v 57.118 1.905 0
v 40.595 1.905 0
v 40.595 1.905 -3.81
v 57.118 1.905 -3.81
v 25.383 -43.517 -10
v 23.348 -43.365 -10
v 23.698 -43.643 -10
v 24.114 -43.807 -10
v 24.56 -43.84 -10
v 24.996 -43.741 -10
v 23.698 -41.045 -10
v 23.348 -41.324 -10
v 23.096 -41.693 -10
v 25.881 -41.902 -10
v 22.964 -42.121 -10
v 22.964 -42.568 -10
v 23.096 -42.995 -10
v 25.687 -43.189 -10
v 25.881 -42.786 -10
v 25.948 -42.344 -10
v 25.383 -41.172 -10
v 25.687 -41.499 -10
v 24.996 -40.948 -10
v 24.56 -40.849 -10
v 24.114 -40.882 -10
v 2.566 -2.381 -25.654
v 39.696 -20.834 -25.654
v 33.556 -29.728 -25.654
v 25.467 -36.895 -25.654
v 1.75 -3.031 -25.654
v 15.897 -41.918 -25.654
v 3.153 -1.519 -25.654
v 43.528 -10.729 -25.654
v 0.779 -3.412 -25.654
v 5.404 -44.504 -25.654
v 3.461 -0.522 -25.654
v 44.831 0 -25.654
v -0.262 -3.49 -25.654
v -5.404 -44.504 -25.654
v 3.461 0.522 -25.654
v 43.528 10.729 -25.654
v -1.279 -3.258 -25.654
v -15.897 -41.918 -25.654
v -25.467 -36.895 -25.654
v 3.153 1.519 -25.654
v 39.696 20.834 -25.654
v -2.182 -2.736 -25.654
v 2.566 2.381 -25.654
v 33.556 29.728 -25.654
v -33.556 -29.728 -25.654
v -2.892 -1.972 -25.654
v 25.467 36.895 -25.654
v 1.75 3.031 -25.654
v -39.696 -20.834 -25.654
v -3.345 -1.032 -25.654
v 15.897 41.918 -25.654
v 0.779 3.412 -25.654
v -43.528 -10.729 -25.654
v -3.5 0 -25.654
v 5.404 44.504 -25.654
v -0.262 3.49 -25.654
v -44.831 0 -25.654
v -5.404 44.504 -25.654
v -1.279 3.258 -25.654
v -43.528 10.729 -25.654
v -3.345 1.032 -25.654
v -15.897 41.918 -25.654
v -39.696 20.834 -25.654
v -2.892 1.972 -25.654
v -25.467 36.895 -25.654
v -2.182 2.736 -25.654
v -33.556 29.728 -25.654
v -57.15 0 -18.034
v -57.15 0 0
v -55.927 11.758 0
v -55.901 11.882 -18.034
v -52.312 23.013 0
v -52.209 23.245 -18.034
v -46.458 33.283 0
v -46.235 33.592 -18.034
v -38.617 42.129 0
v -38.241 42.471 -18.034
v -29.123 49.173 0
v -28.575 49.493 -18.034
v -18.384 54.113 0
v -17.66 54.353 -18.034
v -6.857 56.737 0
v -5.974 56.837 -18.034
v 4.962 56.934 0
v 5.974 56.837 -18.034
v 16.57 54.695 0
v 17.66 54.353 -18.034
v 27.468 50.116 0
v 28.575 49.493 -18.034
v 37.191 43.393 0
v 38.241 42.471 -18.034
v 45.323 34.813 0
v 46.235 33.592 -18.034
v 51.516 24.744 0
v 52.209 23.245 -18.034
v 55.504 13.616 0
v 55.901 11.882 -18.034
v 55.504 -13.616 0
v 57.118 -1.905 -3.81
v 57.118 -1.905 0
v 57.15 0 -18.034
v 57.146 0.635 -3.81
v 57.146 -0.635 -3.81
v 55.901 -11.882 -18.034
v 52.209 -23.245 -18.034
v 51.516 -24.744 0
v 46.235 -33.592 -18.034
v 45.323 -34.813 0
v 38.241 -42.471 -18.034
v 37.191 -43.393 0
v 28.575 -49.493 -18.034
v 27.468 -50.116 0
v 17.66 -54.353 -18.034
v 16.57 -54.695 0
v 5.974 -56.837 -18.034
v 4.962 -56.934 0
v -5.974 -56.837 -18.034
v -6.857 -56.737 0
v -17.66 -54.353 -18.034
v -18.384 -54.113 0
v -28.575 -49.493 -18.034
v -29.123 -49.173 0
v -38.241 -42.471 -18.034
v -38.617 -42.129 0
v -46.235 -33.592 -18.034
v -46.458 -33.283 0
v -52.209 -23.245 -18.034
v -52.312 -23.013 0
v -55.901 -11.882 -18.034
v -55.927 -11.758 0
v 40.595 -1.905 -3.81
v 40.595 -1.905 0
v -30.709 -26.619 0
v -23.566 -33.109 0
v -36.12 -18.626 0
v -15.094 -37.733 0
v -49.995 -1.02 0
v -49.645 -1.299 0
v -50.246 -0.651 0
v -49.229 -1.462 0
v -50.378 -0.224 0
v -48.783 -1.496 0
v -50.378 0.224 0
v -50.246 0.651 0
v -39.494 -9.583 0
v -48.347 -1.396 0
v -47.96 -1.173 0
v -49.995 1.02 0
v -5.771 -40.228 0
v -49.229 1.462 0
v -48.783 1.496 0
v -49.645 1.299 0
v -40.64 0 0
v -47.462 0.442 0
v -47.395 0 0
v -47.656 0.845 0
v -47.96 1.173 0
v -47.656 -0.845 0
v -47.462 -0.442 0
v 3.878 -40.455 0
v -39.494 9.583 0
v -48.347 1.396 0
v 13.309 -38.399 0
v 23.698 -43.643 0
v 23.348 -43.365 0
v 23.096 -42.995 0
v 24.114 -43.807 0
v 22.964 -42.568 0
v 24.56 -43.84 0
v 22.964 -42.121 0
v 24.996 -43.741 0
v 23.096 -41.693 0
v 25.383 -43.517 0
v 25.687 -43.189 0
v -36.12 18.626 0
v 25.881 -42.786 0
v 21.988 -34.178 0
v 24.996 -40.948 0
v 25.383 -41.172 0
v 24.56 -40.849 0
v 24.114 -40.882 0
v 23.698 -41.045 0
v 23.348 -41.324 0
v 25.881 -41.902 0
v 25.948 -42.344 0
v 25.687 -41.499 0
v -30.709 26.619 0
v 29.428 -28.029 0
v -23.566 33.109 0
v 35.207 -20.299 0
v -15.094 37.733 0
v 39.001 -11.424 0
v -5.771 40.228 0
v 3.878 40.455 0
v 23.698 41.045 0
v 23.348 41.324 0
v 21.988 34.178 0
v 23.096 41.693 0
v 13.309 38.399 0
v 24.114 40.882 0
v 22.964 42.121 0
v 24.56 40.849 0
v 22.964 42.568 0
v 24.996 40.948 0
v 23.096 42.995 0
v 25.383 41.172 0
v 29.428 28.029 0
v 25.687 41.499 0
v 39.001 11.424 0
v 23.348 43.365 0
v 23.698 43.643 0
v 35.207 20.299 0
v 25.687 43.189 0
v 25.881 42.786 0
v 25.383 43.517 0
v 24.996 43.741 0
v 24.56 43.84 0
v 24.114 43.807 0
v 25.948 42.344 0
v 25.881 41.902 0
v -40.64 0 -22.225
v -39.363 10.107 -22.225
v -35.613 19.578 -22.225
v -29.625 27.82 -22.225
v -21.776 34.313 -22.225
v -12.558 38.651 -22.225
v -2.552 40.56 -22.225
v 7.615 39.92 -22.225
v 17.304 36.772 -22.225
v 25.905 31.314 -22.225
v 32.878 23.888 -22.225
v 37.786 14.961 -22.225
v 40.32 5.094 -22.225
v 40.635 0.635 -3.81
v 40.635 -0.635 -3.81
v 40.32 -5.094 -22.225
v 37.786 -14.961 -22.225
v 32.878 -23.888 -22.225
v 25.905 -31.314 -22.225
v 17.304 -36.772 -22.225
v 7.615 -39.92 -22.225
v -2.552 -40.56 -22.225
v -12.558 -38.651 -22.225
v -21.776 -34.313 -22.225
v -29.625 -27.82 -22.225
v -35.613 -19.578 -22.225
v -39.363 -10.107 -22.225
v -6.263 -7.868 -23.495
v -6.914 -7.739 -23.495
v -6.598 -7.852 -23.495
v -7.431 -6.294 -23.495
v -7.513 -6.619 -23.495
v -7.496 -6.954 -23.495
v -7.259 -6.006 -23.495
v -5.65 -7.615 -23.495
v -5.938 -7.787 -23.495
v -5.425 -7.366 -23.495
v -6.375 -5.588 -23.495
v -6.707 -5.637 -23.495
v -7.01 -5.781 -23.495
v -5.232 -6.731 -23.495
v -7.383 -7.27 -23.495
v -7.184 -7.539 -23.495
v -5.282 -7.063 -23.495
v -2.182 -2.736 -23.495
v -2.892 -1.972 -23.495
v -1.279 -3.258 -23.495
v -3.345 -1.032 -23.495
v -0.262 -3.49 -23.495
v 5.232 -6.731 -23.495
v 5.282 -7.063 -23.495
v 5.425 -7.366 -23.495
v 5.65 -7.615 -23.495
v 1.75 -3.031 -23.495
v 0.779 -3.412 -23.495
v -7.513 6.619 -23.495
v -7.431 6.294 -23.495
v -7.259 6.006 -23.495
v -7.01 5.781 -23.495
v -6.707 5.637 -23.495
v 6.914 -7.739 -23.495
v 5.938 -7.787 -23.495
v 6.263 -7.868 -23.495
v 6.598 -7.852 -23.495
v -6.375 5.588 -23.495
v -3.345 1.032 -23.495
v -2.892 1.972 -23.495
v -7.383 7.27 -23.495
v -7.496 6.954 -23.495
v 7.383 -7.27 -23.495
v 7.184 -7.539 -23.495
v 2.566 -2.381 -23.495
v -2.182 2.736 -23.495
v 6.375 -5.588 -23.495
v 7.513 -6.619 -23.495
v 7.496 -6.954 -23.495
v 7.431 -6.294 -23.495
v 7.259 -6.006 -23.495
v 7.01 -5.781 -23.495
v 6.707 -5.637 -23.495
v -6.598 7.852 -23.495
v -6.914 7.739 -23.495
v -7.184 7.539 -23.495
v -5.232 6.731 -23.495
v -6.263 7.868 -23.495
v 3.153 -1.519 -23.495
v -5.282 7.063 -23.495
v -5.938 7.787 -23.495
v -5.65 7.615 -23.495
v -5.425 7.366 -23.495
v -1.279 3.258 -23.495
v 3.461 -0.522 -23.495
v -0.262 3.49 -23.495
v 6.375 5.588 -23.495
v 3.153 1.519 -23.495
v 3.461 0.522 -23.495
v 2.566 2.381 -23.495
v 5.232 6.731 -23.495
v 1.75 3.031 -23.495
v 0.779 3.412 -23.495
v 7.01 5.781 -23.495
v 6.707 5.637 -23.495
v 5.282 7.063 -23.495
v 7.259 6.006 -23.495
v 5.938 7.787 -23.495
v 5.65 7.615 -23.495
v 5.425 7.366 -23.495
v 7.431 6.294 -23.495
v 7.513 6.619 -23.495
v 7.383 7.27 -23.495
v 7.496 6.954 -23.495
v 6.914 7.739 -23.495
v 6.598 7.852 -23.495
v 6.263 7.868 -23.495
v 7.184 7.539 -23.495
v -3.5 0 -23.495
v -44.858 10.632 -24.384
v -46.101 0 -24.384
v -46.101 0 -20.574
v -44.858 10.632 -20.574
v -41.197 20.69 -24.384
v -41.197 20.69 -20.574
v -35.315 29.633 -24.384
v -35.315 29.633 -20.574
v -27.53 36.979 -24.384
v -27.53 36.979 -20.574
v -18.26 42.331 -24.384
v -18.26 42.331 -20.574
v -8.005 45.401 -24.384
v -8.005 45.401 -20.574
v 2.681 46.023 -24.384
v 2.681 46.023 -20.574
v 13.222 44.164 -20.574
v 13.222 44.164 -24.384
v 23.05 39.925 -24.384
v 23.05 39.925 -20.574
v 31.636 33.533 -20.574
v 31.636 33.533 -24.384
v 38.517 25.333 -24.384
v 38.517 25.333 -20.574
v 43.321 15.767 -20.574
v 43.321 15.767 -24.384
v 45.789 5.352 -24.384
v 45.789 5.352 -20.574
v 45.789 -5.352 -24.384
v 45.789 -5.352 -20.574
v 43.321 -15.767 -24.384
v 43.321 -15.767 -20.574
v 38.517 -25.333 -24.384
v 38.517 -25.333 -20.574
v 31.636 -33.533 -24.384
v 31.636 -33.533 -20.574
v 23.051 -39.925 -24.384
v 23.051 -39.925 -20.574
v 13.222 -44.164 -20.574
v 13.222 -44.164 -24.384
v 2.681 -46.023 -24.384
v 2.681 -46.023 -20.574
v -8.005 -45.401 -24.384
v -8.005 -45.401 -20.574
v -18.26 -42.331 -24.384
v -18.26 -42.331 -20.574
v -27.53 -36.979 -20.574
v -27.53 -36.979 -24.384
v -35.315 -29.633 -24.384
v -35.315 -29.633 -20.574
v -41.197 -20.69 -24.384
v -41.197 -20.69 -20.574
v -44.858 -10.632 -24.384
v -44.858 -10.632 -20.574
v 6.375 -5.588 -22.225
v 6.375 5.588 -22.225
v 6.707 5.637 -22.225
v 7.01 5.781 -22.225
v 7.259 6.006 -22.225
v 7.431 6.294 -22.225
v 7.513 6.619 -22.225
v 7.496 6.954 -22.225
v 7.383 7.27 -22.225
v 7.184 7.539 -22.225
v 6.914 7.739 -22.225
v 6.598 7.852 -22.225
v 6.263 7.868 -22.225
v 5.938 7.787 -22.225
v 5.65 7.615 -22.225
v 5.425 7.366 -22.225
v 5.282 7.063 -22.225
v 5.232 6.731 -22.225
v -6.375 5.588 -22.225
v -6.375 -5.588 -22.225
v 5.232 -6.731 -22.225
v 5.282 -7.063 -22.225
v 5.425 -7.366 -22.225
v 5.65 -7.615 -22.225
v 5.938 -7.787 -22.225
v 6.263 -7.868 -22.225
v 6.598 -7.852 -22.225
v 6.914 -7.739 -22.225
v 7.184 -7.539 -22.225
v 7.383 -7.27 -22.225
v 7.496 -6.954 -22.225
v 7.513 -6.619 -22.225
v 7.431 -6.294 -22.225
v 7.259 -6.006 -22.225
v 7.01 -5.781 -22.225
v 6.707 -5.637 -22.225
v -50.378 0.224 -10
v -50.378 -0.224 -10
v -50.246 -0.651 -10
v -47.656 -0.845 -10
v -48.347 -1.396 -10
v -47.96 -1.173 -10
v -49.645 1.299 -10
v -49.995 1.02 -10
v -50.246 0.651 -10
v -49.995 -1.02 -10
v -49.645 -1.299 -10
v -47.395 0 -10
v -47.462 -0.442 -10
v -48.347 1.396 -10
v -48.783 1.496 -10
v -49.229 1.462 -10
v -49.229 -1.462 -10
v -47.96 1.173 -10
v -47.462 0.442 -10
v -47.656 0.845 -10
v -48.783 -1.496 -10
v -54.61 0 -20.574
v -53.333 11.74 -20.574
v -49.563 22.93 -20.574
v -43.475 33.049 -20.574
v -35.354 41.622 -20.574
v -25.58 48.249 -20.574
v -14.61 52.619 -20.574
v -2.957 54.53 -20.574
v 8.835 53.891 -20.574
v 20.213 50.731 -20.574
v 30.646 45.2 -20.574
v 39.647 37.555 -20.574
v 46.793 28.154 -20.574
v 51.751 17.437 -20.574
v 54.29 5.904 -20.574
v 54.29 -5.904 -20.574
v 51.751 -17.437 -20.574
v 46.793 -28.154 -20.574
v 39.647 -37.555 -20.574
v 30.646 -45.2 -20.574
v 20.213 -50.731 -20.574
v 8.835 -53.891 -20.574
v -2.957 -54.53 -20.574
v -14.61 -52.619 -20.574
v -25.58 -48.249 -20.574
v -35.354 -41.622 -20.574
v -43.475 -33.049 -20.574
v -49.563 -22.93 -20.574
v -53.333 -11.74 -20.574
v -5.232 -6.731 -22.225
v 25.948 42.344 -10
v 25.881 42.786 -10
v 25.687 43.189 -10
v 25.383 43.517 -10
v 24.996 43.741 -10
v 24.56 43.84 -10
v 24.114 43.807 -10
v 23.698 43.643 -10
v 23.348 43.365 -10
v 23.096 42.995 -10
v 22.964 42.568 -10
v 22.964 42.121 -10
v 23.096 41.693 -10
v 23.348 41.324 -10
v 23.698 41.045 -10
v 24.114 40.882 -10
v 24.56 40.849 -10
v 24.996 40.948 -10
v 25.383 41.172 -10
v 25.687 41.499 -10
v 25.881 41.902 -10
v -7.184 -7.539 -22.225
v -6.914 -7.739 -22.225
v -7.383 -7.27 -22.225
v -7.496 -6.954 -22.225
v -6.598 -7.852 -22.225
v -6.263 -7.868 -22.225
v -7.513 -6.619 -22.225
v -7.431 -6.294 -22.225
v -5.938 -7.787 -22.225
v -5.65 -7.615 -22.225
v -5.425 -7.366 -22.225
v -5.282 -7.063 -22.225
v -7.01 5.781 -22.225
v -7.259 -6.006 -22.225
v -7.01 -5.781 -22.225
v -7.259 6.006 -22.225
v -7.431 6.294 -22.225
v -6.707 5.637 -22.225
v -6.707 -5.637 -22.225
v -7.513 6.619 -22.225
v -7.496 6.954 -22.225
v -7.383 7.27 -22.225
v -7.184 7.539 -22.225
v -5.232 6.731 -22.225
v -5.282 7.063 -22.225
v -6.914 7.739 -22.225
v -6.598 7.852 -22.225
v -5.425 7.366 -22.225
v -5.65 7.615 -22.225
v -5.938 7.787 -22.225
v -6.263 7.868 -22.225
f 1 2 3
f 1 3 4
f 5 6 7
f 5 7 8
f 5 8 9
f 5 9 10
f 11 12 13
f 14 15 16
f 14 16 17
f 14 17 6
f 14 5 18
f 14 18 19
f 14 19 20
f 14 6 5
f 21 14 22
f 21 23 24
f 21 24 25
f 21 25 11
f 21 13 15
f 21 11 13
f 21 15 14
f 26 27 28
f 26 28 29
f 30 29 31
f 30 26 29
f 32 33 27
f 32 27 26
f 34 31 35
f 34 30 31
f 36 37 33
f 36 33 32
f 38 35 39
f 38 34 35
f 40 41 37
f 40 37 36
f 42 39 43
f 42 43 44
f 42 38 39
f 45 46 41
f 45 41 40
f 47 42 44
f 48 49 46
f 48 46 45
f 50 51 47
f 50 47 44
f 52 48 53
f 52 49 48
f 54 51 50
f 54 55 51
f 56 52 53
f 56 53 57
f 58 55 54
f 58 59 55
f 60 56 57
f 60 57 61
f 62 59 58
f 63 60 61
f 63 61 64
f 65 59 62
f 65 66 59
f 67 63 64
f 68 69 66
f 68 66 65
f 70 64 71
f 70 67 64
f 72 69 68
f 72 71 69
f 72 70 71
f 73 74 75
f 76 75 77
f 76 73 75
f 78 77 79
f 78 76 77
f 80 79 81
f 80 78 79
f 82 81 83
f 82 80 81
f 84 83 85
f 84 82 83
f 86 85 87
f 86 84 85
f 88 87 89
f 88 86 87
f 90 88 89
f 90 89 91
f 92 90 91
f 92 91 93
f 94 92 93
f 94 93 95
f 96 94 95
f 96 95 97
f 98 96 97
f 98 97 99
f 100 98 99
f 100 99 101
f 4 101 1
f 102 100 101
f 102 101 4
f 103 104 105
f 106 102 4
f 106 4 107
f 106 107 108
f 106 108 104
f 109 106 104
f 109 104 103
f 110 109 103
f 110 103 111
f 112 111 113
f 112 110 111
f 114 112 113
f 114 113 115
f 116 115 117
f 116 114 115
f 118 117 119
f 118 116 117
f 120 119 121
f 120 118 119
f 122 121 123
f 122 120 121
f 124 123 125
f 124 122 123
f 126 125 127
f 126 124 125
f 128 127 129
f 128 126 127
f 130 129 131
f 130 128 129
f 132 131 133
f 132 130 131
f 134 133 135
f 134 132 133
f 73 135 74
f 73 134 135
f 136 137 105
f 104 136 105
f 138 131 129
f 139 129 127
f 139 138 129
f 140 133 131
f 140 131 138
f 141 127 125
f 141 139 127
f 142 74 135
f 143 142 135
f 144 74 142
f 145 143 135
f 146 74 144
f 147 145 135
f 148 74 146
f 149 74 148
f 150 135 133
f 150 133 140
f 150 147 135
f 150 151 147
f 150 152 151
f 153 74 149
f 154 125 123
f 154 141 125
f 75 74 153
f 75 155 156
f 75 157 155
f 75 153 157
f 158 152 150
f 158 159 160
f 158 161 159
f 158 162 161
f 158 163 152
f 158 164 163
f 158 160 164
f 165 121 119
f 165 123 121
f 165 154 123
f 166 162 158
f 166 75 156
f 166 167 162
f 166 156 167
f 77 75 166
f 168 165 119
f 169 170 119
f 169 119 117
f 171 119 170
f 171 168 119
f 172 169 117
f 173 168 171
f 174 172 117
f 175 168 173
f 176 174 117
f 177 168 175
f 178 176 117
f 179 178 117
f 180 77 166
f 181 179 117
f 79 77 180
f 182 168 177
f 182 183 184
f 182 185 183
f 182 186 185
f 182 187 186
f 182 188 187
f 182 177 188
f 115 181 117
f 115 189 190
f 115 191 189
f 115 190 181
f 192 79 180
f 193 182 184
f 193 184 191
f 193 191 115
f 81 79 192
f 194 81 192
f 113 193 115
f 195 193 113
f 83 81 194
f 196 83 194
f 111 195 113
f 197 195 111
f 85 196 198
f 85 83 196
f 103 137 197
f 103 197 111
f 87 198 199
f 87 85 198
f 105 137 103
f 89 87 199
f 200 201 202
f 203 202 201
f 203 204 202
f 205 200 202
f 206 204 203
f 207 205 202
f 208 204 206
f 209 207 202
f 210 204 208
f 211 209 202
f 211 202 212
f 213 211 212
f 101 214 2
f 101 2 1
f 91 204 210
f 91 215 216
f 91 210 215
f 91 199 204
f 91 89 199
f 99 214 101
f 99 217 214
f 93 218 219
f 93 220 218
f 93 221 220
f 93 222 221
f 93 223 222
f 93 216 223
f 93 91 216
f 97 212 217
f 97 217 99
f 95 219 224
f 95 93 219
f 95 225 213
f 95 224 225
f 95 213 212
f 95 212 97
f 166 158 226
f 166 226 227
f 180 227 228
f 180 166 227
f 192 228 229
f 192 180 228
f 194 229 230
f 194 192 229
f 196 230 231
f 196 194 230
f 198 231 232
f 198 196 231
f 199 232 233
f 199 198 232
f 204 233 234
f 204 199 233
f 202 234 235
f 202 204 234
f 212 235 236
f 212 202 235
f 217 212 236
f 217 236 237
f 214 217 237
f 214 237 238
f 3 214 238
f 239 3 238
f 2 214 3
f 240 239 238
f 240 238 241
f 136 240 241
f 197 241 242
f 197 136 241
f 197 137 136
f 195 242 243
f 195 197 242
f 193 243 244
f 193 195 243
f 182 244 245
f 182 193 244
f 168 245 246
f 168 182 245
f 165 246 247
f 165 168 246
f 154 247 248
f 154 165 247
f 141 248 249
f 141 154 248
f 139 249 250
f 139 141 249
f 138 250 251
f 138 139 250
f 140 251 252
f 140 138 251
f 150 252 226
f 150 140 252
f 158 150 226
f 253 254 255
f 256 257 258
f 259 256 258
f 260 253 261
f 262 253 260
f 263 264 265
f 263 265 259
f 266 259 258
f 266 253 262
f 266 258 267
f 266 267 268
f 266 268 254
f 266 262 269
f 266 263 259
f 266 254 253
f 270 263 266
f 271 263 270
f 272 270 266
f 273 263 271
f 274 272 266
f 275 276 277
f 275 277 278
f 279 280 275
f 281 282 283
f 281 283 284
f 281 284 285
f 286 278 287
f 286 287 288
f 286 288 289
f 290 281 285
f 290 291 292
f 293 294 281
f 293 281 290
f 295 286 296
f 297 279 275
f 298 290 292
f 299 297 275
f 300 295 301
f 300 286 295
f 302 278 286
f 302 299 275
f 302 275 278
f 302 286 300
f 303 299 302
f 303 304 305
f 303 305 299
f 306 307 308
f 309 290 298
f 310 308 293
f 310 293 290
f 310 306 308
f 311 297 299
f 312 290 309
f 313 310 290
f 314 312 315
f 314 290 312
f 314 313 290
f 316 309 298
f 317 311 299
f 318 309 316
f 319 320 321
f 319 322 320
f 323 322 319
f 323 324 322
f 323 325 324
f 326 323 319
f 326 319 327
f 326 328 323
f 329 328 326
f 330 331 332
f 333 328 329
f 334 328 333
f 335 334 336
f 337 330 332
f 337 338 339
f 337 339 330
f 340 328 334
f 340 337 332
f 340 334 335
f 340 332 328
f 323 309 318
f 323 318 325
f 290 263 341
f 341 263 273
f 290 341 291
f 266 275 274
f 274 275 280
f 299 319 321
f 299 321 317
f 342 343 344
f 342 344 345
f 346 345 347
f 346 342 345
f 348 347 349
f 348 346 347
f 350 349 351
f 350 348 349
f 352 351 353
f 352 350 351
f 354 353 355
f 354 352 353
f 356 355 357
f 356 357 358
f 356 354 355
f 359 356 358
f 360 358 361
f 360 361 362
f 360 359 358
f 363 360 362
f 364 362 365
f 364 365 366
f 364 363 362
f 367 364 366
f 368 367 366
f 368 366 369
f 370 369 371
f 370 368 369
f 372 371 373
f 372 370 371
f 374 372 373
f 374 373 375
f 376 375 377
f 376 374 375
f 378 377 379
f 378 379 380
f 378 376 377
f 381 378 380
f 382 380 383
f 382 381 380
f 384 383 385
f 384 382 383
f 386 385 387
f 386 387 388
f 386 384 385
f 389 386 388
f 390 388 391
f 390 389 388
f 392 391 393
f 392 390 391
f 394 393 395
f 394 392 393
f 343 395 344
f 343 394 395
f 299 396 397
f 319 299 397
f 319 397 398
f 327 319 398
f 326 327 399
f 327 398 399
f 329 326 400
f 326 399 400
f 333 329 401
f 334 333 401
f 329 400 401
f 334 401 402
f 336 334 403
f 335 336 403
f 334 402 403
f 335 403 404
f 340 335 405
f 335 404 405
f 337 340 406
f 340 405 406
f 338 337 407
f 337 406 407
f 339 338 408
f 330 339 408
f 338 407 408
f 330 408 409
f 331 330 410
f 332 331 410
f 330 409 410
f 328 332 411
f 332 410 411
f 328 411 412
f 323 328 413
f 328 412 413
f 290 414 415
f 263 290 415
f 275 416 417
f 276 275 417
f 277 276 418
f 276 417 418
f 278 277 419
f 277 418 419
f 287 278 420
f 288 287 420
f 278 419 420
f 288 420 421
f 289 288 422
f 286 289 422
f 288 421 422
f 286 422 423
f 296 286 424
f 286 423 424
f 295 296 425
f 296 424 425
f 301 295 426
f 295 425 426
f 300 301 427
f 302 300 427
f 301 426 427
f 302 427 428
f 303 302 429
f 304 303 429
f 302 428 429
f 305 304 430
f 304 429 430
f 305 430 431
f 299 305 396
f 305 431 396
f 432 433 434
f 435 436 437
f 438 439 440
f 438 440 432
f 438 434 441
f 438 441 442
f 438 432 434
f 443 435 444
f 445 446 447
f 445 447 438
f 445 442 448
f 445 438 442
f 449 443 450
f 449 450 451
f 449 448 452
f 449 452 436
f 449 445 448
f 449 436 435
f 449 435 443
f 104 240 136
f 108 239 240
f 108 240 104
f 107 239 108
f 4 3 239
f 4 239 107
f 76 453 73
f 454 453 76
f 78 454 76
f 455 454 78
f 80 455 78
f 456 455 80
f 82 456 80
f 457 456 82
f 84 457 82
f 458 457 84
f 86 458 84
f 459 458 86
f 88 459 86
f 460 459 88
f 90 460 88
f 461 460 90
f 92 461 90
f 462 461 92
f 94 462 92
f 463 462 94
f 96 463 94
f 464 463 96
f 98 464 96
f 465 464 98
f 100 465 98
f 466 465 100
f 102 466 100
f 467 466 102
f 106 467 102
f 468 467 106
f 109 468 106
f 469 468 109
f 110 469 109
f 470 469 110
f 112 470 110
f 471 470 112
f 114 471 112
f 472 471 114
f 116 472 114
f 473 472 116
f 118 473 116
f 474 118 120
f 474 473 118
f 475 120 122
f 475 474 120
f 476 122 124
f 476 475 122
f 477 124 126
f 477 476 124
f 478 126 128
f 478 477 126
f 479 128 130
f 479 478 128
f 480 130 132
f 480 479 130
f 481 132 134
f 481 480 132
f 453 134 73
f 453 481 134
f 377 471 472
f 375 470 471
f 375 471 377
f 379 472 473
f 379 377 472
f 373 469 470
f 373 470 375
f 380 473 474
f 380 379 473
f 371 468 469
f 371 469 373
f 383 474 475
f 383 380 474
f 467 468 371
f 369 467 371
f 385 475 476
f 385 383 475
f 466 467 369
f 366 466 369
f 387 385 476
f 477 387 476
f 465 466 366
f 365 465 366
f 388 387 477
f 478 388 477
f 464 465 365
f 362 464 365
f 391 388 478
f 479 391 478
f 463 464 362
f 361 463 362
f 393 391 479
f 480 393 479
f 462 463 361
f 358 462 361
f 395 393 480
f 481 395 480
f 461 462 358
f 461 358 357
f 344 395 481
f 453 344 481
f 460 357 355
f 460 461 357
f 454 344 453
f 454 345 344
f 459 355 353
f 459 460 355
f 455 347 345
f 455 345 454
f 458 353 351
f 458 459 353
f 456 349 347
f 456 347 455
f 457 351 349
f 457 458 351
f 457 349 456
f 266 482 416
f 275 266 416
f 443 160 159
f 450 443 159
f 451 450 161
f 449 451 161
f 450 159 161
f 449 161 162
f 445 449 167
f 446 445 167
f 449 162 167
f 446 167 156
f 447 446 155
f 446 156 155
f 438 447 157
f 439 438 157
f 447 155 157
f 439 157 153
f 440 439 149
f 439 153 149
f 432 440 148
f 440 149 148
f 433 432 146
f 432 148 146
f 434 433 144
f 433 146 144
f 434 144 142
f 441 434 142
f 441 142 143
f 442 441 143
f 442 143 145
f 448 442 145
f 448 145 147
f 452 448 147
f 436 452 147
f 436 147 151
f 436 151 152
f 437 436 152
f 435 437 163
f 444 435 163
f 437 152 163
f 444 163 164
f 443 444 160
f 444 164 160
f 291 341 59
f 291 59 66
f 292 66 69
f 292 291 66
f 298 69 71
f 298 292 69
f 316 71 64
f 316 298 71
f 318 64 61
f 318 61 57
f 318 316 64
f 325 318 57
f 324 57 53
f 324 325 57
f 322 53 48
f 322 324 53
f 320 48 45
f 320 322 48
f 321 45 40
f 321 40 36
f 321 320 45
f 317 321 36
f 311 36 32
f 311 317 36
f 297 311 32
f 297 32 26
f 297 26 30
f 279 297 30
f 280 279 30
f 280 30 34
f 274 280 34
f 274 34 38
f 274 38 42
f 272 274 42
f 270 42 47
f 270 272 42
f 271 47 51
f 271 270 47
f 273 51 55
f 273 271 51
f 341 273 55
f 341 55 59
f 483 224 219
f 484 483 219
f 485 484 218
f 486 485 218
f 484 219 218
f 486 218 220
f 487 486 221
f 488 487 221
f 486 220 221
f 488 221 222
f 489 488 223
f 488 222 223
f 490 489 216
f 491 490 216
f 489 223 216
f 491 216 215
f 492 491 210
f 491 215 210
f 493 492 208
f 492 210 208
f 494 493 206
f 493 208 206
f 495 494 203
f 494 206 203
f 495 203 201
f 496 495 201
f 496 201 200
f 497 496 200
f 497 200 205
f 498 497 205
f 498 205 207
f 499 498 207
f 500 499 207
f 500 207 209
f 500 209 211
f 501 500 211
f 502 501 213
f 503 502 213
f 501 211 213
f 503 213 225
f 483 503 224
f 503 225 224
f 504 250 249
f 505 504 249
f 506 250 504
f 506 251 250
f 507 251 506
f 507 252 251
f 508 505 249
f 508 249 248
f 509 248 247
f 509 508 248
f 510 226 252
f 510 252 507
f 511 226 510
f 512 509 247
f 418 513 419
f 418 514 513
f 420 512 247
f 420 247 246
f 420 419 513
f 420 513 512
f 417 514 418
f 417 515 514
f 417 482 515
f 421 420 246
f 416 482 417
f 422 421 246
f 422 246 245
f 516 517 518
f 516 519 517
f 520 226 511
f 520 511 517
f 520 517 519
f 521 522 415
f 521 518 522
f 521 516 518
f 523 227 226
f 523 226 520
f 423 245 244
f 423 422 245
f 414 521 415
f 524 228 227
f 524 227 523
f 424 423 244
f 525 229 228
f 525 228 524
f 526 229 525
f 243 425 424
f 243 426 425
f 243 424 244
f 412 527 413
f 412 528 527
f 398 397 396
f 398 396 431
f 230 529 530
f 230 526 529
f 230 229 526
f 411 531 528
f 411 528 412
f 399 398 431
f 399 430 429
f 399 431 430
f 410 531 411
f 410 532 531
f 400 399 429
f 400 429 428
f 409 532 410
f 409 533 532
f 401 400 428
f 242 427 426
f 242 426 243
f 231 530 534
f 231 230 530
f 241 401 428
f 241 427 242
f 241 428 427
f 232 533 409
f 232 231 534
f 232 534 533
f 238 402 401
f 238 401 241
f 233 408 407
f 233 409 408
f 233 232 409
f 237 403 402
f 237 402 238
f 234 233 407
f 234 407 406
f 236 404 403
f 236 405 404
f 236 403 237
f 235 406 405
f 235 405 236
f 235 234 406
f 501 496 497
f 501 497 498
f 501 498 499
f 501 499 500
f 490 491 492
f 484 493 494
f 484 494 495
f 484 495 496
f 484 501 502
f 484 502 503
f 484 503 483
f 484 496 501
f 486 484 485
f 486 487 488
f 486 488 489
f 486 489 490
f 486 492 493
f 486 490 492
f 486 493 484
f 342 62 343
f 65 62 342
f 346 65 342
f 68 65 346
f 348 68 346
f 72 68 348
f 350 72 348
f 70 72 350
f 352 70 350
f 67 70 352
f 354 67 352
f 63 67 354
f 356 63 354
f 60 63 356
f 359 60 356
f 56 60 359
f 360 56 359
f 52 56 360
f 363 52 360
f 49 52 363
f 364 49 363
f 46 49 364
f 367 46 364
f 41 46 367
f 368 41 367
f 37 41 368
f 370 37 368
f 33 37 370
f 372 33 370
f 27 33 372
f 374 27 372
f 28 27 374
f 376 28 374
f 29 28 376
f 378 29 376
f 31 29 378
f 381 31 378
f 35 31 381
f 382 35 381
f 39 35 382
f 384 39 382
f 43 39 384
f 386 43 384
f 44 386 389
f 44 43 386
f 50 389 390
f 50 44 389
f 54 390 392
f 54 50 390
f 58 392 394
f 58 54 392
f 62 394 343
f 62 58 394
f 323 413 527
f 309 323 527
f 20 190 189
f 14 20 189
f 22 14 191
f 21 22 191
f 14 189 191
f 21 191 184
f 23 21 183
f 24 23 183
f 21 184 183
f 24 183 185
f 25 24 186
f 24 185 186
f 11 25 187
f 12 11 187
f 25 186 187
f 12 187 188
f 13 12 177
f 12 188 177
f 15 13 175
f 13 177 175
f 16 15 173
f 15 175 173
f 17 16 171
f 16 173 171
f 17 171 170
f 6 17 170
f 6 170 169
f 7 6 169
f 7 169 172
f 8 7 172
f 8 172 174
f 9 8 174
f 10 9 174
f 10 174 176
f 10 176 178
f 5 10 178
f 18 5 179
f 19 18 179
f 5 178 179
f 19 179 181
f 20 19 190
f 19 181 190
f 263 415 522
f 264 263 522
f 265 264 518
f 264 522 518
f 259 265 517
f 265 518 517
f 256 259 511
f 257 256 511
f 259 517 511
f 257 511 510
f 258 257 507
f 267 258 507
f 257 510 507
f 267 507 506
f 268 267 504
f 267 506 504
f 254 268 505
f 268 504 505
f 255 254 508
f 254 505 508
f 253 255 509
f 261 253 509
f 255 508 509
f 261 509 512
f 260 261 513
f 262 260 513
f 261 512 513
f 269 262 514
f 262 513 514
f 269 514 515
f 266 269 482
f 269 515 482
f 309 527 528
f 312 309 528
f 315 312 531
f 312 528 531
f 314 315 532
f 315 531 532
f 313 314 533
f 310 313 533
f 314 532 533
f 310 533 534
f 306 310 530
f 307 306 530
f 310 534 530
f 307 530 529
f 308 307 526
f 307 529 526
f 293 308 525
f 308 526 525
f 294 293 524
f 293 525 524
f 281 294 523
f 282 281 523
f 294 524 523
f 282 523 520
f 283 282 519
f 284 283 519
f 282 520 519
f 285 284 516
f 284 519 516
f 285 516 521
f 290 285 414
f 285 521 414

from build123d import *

# Parameters (mm, degrees)
F2_SIZE  = 2.54
F3_SIZE  = 1.27
F5_DEPTH = 1.27
F6_R     = 1.5
F7_DEPTH = 10
F8_W     = 32.420068
F8_H     = 3.81
F9_DEPTH = 3.81


with BuildPart() as f1:
    # F0 (on Front) → F1 (revolve)
    with BuildSketch(Plane.XZ):
        Polygon((-40.64, 0), (-57.15, 0), (-57.15, -20.574), (-46.101, -20.574), (-46.101, -25.654), (-3.5, -25.654), (-3.5, -22.225), (-40.64, -22.225), align=None)
    revolve(axis=Axis((0, 0, 19.796192), (0, 0, -1)))

    # F2
    f2_edges = [f1.edges().sort_by_distance(p)[0] for p in [
        (57.15, 0, -20.574),
    ]]
    chamfer(f2_edges, length=F2_SIZE)

    # F3
    f3_edges = [f1.edges().sort_by_distance(p)[0] for p in [
        (46.101, 0, -25.654),
    ]]
    chamfer(f3_edges, length=F3_SIZE)

    # F4 (on face) → F5 (cut)
    with BuildSketch(Plane.XY.offset(-22.225)):
        with BuildLine():
            Line((5.2324, 6.731), (-5.2324, 6.731))
            ThreePointArc((-5.2324, 6.731), (-7.183623, 7.539223), (-6.3754, 5.588))
            Line((-6.3754, 5.588), (-6.3754, -5.588))
            ThreePointArc((-6.3754, -5.588), (-7.183623, -7.539223), (-5.2324, -6.731))
            Line((-5.2324, -6.731), (5.2324, -6.731))
            ThreePointArc((5.2324, -6.731), (7.183623, -7.539223), (6.3754, -5.588))
            Line((6.3754, -5.588), (6.3754, 5.588))
            ThreePointArc((6.3754, 5.588), (7.183623, 7.539223), (5.2324, 6.731))
        make_face()
    extrude(amount=-F5_DEPTH, mode=Mode.SUBTRACT)

    # F6 (on face) → F7 (cut)
    with BuildSketch(Plane.XY):
        with Locations((-48.895, 0)):
            Circle(F6_R)
        with Locations((24.4475, -42.344312)):
            Circle(F6_R)
        with Locations((24.4475, 42.344312)):
            Circle(F6_R)
    extrude(amount=-F7_DEPTH, mode=Mode.SUBTRACT)

    # F8 (on face) → F9 (cut)
    with BuildSketch(Plane.XY):
        with Locations((49.065037, 0)):
            Rectangle(F8_W, F8_H)
    extrude(amount=-F9_DEPTH, mode=Mode.SUBTRACT)


solid = f1.part
